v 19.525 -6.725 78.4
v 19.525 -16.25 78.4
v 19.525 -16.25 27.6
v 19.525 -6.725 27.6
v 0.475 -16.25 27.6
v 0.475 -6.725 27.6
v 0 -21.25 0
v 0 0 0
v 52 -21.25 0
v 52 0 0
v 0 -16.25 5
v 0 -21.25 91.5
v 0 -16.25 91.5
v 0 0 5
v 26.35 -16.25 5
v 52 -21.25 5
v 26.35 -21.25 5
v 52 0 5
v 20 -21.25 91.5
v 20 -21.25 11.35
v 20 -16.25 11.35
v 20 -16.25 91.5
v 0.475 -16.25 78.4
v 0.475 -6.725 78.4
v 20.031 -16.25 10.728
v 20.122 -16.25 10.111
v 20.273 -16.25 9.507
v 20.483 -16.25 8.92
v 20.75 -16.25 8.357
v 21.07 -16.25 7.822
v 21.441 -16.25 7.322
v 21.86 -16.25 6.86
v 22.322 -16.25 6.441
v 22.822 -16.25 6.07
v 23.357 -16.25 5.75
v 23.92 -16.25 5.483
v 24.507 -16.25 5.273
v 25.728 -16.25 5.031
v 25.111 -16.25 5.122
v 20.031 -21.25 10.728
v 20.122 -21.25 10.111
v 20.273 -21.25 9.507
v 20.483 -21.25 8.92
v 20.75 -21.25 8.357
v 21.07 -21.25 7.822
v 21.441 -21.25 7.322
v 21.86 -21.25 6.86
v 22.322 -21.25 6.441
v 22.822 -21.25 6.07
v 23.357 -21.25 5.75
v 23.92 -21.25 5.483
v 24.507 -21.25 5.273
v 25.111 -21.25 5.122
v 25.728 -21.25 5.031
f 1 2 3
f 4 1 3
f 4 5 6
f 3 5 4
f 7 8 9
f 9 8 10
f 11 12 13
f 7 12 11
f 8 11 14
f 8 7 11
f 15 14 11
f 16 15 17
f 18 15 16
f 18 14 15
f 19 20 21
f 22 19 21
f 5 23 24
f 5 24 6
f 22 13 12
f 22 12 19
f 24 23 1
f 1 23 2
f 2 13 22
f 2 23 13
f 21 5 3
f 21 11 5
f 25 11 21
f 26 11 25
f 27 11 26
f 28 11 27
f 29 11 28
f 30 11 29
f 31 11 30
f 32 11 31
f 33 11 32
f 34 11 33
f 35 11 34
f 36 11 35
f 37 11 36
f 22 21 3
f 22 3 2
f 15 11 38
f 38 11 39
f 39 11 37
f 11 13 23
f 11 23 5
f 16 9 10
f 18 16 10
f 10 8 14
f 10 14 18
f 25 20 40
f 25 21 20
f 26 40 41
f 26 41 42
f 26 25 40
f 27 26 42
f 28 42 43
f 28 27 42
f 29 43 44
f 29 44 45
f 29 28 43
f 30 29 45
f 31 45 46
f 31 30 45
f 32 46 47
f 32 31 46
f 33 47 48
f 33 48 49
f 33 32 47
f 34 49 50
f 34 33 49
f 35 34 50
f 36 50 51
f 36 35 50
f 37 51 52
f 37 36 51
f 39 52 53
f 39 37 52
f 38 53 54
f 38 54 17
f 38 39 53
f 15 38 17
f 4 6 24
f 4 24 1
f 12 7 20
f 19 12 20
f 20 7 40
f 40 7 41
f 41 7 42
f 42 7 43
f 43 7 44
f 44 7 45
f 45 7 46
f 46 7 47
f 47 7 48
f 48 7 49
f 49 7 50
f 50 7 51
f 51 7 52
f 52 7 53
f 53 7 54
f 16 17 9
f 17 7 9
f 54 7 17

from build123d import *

# Parameters (mm, degrees)
SKETCH1_W      = 52
SKETCH1_H      = 21.25
EXTRUDE1_DEPTH = 5
SKETCH2_W      = 20
SKETCH2_H      = 5
EXTRUDE2_DEPTH = 86.5
FILLET1_R      = 6.35
SKETCH3_W      = 19.05
SKETCH3_H      = 50.8
EXTRUDE3_DEPTH = 9.525


with BuildPart() as part:
    # Sketch1 → Extrude1 (new body)
    with BuildSketch(Plane.XY):
        with Locations((26, -10.625)):
            Rectangle(SKETCH1_W, SKETCH1_H)
    extrude(amount=EXTRUDE1_DEPTH)

    # Sketch2 → Extrude2 (add)
    with BuildSketch(Plane.XY.offset(5)):
        with Locations((10, -18.75)):
            Rectangle(SKETCH2_W, SKETCH2_H)
    extrude(amount=EXTRUDE2_DEPTH)

    # Fillet1
    fillet1_edges = [part.edges().sort_by_distance(p)[0] for p in [
        (20, -18.75, 5),
    ]]
    fillet(fillet1_edges, radius=FILLET1_R)

    # Sketch3 → Extrude3 (add)
    with BuildSketch(Plane(origin=(0, -16.25, 0), x_dir=(1, 0, 0), z_dir=(0, 1, 0))):
        with Locations((10, -53)):
            Rectangle(SKETCH3_W, SKETCH3_H)
    extrude(amount=EXTRUDE3_DEPTH)


solid = part.part
